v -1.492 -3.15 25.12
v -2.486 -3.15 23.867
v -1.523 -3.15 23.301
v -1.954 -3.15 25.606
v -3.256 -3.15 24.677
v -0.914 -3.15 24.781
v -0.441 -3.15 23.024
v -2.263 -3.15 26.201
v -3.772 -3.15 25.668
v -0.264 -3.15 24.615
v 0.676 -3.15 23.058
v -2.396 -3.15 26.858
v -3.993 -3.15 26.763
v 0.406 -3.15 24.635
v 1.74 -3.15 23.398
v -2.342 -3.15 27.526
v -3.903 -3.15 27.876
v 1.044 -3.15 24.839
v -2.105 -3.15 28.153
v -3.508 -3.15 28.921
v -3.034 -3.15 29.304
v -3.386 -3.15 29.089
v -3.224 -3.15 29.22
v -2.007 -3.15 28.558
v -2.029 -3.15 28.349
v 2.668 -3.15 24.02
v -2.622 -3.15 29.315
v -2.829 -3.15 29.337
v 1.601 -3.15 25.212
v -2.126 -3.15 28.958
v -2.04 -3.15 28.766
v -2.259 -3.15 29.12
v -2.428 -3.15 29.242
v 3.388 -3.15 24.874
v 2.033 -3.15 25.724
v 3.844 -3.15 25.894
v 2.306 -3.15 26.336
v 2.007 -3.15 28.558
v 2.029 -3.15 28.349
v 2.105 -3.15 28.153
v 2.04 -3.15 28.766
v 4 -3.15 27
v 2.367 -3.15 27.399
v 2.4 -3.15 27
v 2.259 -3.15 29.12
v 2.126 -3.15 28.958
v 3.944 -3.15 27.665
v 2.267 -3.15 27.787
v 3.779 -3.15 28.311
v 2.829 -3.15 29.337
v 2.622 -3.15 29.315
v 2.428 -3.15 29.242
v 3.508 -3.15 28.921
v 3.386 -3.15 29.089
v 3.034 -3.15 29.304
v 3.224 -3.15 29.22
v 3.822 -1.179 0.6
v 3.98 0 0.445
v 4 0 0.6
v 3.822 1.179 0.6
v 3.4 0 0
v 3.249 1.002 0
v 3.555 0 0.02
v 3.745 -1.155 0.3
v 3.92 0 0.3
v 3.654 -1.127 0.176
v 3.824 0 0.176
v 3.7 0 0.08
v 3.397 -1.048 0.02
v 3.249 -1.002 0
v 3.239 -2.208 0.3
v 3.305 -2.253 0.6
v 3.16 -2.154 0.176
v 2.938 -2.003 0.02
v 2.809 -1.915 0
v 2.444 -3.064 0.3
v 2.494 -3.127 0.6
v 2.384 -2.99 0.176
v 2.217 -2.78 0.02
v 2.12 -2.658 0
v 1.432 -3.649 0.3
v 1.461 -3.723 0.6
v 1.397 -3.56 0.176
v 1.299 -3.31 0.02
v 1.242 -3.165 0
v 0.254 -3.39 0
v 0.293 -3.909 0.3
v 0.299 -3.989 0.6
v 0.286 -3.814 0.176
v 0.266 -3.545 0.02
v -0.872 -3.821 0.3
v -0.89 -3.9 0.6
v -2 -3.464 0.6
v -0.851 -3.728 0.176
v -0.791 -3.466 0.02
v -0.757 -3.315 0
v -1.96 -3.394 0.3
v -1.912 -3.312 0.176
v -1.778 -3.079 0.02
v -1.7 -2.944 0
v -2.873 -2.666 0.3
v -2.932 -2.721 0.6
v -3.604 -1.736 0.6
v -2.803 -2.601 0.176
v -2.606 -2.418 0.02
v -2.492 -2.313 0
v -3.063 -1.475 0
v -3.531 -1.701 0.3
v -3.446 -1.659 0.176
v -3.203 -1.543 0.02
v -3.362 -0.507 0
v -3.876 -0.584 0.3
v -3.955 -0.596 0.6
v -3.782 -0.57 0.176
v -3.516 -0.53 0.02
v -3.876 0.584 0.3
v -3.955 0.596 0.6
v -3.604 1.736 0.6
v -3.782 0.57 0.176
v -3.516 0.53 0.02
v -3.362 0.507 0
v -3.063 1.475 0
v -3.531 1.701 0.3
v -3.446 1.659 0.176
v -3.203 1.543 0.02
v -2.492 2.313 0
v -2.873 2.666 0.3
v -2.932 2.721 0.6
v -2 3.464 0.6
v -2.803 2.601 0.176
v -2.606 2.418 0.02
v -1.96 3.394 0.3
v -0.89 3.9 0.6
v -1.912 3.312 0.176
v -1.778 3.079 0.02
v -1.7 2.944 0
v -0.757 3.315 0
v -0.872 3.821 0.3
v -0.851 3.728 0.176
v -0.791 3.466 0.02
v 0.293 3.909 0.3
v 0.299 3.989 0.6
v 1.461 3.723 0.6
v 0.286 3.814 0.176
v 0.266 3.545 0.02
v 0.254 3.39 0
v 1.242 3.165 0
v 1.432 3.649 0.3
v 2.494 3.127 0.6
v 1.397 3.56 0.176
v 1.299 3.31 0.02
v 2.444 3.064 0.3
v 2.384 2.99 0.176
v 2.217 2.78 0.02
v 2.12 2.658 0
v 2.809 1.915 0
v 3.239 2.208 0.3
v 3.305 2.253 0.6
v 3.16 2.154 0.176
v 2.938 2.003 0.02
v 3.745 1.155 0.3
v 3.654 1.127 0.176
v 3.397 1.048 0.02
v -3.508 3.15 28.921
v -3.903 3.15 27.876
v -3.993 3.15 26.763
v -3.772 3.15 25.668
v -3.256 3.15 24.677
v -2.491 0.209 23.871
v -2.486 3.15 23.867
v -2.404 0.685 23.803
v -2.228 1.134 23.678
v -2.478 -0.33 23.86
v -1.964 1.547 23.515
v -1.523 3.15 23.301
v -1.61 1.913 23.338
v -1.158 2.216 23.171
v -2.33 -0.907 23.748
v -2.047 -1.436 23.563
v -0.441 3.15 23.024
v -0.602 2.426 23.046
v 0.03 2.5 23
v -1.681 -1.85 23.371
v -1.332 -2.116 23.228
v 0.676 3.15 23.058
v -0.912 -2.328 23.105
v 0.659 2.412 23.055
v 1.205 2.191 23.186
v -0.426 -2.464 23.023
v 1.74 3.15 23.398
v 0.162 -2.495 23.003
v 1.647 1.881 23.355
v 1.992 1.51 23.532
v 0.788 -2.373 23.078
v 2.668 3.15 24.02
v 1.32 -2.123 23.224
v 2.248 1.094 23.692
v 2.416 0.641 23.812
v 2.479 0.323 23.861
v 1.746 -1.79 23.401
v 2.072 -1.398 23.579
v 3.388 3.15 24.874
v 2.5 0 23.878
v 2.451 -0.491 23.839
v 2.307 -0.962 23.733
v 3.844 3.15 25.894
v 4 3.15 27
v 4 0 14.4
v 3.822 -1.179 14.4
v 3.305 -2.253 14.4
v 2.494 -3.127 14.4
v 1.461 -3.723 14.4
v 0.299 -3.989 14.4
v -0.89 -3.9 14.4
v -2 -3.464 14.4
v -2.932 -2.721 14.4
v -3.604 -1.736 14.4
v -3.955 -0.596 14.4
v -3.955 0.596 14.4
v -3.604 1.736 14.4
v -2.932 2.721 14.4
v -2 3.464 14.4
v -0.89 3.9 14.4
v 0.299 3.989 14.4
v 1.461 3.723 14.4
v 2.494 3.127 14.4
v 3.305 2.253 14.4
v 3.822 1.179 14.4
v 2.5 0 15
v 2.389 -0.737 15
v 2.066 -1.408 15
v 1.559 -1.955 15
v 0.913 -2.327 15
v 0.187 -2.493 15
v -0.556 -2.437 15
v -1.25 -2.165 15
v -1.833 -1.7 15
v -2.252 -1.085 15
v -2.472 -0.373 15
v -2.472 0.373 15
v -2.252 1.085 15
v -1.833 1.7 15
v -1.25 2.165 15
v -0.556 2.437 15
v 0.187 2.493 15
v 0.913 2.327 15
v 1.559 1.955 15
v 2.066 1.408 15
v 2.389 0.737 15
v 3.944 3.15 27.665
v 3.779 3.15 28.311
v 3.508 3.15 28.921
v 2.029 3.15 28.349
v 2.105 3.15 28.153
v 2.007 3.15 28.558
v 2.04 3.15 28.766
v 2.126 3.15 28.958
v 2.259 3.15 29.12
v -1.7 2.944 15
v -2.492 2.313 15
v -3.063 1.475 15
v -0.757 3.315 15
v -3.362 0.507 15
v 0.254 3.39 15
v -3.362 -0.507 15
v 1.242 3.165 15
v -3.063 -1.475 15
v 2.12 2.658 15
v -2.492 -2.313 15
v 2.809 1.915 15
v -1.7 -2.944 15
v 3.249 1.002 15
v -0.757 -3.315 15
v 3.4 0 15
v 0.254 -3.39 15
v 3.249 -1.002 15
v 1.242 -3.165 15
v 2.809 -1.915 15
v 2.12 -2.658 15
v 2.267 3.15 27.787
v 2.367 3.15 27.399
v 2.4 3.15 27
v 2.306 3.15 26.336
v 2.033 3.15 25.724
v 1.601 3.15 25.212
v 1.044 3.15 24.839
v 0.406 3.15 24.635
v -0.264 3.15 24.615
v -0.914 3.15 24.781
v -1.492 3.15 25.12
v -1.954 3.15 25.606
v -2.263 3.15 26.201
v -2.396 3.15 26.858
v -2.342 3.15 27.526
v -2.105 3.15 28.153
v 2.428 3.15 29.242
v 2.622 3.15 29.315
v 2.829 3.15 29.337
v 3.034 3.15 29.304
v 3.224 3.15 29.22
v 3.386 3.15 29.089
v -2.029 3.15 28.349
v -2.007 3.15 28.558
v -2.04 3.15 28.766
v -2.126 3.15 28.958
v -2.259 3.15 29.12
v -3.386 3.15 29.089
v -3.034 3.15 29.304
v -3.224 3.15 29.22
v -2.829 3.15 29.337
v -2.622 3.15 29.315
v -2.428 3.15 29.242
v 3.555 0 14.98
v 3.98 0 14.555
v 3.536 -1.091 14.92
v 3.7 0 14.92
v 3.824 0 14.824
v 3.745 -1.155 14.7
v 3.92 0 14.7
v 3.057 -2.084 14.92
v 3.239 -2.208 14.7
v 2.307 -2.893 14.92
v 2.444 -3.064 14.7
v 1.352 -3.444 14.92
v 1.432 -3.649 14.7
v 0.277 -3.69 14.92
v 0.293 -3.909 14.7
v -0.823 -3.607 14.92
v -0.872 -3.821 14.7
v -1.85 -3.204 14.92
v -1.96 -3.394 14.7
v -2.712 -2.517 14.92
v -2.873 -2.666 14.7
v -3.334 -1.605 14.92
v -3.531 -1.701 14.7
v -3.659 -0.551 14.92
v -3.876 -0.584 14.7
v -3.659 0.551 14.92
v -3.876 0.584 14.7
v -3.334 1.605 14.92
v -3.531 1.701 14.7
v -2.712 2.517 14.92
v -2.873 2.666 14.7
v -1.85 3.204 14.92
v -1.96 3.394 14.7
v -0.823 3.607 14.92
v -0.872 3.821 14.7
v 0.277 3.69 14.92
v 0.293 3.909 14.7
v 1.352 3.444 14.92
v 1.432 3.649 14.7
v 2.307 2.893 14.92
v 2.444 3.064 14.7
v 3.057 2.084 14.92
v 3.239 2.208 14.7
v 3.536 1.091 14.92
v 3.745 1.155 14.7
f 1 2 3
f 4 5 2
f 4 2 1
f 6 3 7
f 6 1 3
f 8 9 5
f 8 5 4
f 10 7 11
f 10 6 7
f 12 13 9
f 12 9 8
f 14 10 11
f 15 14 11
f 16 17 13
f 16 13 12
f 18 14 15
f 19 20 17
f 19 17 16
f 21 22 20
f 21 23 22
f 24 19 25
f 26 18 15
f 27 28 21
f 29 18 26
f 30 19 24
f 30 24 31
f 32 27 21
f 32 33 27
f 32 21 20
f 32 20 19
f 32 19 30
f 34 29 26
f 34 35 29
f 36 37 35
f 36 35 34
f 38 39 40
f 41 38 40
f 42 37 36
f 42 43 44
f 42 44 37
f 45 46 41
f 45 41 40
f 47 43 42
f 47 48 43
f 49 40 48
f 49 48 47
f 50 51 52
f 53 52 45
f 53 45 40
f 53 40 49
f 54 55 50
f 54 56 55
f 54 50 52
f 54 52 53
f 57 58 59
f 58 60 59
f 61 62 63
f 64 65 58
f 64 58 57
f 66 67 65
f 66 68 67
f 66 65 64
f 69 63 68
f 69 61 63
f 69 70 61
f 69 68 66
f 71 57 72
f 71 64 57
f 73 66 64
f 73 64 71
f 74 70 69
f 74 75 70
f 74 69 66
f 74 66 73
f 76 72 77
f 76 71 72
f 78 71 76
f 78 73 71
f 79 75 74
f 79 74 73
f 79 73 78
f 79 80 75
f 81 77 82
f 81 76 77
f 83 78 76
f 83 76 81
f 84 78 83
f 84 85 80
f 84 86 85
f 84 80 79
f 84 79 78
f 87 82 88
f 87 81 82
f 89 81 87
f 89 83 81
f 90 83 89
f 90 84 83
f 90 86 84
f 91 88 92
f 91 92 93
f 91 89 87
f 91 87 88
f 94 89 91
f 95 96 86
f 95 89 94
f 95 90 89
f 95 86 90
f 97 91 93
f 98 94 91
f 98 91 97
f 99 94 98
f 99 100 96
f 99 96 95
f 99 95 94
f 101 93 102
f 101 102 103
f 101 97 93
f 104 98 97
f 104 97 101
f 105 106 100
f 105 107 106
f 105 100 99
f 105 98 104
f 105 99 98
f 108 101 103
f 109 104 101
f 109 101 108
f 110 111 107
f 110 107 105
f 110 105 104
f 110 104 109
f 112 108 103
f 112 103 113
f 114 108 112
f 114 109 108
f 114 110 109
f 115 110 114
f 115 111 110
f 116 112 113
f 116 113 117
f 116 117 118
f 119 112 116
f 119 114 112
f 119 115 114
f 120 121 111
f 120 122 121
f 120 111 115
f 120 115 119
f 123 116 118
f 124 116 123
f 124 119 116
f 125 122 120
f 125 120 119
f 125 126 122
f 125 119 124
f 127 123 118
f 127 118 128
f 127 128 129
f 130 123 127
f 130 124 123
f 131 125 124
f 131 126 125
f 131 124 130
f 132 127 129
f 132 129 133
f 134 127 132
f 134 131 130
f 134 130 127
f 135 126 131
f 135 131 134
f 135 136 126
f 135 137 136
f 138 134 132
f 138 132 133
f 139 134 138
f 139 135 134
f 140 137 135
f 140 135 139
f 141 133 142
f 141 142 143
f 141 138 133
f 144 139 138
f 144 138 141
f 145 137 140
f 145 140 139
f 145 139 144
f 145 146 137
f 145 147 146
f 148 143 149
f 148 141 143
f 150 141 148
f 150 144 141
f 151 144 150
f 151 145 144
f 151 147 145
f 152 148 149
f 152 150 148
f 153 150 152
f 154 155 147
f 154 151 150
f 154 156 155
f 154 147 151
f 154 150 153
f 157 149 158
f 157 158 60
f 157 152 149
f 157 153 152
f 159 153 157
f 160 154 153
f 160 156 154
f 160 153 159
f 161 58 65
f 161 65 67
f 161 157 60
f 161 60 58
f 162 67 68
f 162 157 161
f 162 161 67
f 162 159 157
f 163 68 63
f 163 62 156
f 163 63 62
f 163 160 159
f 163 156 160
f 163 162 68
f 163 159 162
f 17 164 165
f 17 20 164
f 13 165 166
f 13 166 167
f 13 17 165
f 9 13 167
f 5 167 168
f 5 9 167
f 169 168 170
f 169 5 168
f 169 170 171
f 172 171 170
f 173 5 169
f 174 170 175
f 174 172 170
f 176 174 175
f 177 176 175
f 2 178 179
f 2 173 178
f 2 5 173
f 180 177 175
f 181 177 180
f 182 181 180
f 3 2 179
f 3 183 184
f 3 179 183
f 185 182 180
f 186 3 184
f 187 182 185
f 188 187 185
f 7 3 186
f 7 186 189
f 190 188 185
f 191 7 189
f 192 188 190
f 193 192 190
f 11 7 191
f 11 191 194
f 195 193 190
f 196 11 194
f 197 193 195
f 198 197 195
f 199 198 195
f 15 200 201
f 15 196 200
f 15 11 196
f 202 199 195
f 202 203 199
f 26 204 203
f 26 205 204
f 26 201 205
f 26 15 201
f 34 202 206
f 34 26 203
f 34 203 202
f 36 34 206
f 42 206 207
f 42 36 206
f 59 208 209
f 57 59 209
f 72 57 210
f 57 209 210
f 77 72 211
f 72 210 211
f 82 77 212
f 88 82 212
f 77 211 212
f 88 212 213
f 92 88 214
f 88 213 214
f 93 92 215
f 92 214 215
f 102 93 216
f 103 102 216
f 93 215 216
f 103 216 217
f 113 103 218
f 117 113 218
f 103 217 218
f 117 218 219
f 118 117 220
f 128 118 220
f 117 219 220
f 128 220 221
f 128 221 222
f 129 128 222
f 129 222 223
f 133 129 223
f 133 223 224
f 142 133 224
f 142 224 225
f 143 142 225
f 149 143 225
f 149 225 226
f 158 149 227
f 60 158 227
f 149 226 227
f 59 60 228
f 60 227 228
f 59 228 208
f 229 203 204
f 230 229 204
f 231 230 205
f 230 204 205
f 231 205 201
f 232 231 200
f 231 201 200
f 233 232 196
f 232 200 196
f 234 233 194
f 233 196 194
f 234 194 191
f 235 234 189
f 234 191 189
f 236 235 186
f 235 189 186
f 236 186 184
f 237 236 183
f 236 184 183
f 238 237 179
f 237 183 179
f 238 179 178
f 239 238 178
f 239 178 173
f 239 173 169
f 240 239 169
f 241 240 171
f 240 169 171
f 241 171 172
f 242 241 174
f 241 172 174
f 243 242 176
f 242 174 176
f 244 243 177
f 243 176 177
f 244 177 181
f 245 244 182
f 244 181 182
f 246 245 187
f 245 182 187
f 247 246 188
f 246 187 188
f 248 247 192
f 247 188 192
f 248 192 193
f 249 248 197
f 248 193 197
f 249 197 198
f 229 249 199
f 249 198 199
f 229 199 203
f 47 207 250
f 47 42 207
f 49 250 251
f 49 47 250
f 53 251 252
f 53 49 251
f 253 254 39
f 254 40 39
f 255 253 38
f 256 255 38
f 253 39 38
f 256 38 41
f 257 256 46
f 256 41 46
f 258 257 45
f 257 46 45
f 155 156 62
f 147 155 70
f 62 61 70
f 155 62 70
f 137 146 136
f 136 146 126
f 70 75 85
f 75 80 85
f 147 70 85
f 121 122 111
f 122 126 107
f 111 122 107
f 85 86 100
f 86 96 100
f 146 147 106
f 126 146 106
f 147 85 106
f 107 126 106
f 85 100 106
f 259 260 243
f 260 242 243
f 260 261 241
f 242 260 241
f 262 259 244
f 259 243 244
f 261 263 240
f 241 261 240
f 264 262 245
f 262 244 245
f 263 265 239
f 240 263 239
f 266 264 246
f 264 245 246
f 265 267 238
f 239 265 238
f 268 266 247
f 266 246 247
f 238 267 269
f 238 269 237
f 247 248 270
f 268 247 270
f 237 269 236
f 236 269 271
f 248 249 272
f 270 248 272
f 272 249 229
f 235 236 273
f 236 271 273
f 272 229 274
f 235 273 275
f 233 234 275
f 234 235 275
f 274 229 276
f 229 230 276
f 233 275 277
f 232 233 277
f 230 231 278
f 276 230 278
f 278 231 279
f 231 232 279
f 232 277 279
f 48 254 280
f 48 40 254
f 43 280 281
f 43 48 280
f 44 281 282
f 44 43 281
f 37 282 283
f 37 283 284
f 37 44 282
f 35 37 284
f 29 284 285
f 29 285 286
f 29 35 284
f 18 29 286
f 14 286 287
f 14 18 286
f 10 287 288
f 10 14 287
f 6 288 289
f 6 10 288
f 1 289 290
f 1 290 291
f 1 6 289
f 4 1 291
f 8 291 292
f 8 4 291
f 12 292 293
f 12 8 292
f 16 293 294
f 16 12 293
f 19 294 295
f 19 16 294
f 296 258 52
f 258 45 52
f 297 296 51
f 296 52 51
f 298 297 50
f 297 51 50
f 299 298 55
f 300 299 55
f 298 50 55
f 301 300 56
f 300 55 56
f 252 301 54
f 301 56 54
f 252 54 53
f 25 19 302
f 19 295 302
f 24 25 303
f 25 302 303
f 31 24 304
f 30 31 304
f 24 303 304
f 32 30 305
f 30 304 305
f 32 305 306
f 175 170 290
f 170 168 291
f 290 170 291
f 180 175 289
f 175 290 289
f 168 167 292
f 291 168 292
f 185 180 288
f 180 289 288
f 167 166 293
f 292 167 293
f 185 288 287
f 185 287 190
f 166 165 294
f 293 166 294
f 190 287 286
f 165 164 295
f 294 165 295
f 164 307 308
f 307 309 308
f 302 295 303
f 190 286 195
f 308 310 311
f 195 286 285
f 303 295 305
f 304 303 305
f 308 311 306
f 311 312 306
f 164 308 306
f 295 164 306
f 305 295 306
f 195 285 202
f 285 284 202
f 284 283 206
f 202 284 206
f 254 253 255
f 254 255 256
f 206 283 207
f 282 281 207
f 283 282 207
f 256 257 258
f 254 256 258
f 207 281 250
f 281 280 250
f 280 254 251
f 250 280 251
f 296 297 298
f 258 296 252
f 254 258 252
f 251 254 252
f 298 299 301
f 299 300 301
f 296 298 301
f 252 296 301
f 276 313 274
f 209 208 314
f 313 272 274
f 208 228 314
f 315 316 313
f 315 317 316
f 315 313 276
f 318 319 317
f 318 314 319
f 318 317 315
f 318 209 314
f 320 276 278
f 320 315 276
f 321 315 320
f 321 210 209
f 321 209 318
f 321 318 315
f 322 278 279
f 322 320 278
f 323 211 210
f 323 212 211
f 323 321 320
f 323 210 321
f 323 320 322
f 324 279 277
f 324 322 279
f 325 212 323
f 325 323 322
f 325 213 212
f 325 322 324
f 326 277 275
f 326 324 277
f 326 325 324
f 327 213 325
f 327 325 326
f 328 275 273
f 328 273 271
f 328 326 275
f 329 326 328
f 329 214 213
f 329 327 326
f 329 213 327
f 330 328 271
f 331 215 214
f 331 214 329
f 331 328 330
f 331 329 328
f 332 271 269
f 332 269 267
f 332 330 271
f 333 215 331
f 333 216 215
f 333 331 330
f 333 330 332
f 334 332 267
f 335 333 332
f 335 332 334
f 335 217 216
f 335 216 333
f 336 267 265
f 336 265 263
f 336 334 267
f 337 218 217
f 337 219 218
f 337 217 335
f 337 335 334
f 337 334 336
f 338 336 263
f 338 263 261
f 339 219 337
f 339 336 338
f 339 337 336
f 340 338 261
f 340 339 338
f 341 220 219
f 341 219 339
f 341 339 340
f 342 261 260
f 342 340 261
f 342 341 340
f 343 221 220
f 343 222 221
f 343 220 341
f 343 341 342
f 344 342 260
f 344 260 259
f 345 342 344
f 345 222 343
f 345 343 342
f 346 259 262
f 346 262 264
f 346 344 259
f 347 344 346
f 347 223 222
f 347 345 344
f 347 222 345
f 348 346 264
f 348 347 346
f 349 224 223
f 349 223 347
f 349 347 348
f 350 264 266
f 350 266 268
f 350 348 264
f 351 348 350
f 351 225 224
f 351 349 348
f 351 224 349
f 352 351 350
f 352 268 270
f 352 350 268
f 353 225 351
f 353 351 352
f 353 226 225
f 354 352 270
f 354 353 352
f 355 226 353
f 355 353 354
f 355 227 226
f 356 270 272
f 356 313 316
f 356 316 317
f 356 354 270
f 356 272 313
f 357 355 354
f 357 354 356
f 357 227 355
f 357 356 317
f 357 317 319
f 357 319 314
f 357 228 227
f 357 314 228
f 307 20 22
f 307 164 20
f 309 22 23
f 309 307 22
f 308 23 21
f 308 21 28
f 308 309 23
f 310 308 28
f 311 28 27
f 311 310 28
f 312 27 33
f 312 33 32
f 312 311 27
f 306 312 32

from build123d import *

# Parameters (mm, degrees)
F3_DEPTH = 3.15
F4_R     = 0.79999
F5_R     = 0.6


# Not quite as in the source:
# - a fillet or chamfer is up to 0.001 mm smaller than in the source, because OpenCascade refuses the exact size


with BuildPart() as f1:
    # F0 (on Front) → F1 (revolve)
    with BuildSketch(Plane.XZ):
        Polygon((0, 24.5), (0, 0), (4, 0), (4, 15), (2.5, 15), (2.5, 24.5), align=None)
    revolve(axis=Axis((0, 0, -0.3548332296), (0, 0, -1)))

    # F2 (on Front) → F3 (join, symmetric)
    with BuildSketch(Plane.XZ):
        with BuildLine():
            ThreePointArc((-2.9166666667, 29.7373446176), (-1.4719601444, 23.2806810659), (4, 27))
            ThreePointArc((4, 27), (3.7193189341, 28.4719601444), (2.9166666667, 29.7373446176))
            Line((2.9166666667, 29.7373446176), (1.75, 28.6424067706))
            ThreePointArc((1.75, 28.6424067706), (2.2315913604, 27.8831760866), (2.4, 27))
            ThreePointArc((2.4, 27), (-0.8831760866, 24.7684086396), (-1.75, 28.6424067706))
            Line((-1.75, 28.6424067706), (-2.9166666667, 29.7373446176))
        make_face()
    extrude(amount=F3_DEPTH, both=True)

    # F4 (radius 0.8 in the source; OpenCascade refuses exactly that, so slightly less here)
    f4_edges = [f1.edges().sort_by_distance(p)[0] for p in [
        (2.916667, -1.575, 29.737345),
        (2.916667, 1.575, 29.737345),
        (1.75, -1.575, 28.642407),
        (1.75, 1.575, 28.642407),
        (-1.75, 1.575, 28.642407),
        (-1.75, -1.575, 28.642407),
        (-2.916667, -1.575, 29.737345),
        (-2.916667, 1.575, 29.737345),
    ]]
    fillet(f4_edges, radius=F4_R)

    # F5
    f5_edges = [f1.edges().sort_by_distance(p)[0] for p in [
        (-4, 0, 0),
        (-4, 0, 15),
    ]]
    fillet(f5_edges, radius=F5_R)


solid = f1.part
